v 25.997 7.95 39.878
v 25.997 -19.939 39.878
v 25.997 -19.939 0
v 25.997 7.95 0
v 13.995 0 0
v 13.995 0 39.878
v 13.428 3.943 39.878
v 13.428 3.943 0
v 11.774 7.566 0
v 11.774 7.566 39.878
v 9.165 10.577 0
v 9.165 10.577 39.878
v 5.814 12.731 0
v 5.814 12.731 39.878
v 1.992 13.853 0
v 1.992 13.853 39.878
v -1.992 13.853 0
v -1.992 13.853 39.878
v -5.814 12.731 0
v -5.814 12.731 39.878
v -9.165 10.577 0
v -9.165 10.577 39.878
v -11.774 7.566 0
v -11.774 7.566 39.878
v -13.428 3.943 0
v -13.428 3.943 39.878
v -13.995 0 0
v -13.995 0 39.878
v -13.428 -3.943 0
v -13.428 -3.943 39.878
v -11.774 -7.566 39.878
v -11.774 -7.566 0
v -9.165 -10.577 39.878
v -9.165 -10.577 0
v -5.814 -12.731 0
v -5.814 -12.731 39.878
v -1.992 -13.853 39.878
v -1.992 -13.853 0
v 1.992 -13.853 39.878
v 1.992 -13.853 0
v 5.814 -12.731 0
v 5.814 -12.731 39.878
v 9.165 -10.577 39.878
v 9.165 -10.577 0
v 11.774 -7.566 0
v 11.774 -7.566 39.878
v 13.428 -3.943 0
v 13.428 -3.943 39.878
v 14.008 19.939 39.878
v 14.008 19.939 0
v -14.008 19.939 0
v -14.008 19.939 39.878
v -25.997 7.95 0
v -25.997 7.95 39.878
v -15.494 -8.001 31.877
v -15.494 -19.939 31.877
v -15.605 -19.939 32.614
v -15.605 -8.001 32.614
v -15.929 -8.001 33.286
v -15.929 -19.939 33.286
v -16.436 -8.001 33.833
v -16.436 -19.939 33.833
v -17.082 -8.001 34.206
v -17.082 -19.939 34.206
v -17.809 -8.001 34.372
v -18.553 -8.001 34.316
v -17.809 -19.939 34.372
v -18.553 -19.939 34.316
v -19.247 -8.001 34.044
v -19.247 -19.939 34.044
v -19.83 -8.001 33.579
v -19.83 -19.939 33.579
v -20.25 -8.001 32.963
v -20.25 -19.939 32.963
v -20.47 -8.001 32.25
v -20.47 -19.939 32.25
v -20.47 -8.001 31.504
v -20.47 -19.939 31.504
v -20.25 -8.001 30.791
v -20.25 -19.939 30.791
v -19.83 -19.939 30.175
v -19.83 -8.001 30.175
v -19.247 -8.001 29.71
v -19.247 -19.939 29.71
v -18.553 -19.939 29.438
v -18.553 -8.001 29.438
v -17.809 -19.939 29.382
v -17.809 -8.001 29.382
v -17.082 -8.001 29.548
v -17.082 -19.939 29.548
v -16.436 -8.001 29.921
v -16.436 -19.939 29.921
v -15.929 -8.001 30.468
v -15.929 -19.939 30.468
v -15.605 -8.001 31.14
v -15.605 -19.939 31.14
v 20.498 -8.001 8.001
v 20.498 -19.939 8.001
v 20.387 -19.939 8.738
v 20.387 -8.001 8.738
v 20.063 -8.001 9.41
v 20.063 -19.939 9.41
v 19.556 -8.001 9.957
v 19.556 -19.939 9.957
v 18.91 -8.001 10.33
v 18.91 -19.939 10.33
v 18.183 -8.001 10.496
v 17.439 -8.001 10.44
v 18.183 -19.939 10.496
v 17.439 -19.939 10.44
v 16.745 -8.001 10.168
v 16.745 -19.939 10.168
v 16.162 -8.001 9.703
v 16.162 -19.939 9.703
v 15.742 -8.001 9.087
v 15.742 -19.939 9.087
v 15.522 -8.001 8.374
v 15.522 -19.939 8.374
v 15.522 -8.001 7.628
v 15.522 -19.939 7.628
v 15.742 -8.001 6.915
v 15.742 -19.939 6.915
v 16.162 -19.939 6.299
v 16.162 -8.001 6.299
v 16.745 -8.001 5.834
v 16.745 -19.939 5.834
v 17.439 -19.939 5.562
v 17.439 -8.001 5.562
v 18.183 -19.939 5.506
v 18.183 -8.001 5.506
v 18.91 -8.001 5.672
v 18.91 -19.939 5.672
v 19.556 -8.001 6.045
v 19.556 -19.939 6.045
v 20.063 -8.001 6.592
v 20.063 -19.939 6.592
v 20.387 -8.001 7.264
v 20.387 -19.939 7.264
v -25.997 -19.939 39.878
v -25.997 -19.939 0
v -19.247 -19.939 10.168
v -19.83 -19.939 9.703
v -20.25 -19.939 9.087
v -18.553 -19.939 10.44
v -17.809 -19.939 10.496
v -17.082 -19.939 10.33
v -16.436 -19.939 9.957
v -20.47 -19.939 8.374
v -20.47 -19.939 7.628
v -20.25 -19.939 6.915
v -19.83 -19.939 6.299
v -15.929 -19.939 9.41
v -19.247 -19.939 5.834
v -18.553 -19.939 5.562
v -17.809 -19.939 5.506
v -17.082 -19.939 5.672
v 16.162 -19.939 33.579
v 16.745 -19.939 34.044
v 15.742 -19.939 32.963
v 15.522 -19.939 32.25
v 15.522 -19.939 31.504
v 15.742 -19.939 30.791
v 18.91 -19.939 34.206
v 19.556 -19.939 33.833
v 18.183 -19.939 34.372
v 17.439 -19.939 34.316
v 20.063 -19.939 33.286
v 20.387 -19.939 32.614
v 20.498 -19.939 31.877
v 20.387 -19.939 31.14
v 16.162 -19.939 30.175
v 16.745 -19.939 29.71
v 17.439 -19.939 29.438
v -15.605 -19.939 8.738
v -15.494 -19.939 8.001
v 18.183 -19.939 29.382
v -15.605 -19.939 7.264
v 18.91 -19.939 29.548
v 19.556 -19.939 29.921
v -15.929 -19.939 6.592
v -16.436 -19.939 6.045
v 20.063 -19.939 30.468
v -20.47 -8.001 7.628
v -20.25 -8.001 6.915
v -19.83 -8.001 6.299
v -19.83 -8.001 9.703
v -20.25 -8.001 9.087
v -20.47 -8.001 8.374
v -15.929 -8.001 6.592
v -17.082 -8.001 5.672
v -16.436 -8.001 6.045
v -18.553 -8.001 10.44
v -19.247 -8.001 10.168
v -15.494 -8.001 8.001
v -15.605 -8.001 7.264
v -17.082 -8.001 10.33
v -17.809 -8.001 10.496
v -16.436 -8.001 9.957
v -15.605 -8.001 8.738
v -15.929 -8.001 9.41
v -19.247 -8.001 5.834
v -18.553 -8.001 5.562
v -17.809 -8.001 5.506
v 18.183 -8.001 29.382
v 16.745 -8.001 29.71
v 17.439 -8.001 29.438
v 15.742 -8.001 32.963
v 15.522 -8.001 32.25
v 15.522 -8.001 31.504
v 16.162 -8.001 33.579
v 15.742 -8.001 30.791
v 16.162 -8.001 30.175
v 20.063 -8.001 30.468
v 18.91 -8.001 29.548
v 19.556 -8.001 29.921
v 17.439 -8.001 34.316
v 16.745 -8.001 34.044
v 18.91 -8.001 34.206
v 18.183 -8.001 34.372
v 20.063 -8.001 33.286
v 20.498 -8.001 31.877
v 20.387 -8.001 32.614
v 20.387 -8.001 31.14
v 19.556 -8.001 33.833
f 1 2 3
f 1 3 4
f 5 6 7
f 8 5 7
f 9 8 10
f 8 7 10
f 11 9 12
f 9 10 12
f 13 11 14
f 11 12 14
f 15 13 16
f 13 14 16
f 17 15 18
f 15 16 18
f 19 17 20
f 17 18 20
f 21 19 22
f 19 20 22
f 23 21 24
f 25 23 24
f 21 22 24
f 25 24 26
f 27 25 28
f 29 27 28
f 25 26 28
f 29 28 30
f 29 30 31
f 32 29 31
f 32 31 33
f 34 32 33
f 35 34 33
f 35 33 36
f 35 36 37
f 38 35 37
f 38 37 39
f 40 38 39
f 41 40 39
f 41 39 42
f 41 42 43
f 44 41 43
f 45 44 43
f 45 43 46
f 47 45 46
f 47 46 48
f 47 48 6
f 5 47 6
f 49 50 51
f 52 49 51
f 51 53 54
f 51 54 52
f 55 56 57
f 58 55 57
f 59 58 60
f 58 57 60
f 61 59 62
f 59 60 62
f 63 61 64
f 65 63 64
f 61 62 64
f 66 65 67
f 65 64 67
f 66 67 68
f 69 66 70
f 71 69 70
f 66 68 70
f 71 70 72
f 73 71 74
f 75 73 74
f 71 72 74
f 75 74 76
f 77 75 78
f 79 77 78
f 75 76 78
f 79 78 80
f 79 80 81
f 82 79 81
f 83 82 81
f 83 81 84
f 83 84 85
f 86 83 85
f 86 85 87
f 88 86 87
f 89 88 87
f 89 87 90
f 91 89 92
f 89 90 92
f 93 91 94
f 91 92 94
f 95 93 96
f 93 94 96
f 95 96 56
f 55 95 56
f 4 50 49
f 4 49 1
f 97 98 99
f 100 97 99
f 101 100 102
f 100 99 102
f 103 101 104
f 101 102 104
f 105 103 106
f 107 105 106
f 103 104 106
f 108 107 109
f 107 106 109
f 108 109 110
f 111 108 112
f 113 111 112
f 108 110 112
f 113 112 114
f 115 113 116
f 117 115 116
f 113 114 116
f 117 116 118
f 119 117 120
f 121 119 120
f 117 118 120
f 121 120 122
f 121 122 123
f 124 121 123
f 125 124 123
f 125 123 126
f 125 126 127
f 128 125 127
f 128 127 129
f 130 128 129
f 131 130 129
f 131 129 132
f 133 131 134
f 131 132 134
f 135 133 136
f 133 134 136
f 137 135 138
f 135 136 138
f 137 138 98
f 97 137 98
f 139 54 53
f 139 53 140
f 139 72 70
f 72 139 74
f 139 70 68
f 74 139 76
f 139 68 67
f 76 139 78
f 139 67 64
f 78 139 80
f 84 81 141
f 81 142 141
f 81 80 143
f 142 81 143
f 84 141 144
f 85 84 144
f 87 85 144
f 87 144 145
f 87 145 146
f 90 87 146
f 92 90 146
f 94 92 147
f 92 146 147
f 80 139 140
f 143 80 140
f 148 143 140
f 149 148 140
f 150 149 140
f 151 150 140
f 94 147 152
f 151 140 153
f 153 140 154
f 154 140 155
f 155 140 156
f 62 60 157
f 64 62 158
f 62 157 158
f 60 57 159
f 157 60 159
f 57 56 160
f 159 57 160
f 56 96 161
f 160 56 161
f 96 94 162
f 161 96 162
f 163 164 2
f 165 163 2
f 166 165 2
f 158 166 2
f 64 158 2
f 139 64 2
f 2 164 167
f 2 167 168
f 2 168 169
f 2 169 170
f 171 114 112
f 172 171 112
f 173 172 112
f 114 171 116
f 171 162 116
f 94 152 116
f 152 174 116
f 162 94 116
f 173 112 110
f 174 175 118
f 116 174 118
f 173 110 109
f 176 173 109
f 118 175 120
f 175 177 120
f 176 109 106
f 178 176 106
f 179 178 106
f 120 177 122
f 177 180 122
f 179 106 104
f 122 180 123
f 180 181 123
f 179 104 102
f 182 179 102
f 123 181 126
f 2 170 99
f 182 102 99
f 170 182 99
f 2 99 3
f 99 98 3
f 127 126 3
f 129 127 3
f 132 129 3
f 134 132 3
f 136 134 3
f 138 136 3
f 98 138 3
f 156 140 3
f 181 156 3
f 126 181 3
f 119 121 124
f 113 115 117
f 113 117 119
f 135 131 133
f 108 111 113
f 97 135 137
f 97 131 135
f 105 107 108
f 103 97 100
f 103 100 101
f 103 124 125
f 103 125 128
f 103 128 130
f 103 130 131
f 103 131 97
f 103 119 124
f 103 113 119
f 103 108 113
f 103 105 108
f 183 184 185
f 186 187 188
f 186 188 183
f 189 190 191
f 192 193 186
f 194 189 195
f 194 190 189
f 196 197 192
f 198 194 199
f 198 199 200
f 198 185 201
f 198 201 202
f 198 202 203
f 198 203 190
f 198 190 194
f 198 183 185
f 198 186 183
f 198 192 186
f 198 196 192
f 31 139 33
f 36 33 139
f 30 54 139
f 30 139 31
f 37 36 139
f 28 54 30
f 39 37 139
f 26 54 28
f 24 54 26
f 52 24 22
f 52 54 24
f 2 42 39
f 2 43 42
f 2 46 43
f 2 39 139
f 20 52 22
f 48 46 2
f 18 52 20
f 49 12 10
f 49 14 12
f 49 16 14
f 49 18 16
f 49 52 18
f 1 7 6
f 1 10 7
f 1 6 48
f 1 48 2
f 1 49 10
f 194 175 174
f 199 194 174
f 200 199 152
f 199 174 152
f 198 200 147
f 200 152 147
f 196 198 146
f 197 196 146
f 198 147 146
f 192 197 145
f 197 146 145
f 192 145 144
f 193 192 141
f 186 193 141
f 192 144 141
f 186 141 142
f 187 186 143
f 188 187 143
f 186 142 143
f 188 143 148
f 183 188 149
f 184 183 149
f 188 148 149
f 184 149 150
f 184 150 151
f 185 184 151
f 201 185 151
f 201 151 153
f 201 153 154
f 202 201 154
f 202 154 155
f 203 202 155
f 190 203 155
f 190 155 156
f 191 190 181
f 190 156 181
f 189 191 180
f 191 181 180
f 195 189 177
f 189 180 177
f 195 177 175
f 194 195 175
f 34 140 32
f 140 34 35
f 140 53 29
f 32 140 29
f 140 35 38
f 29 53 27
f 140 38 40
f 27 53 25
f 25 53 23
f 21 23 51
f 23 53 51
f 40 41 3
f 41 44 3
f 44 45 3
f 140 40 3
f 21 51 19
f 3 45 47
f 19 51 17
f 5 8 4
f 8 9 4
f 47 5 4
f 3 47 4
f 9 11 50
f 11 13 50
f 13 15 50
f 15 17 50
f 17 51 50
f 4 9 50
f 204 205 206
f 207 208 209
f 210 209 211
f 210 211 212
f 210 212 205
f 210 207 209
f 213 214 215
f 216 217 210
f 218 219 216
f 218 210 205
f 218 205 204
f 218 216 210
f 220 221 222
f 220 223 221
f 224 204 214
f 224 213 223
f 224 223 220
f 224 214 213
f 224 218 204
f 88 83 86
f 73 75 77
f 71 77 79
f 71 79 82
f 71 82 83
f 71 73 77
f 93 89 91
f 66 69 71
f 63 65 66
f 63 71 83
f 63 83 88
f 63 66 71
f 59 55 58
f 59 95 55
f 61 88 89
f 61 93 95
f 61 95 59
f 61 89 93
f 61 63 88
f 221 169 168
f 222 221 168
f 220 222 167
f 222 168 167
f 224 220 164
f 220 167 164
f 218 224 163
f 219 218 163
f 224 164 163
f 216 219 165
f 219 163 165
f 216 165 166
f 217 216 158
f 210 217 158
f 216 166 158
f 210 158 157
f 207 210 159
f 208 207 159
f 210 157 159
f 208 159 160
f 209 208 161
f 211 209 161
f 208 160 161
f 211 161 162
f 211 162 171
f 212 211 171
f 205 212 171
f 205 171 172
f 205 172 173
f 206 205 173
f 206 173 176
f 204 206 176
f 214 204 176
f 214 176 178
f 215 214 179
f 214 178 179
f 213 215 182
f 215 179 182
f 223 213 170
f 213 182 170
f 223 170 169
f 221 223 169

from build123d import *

# Parameters (mm, degrees)
F1_DEPTH = 39.878
F2_R     = 13.9954
F3_DEPTH = 39.879
F4_DEPTH = 39.879
F5_DEPTH = 39.879
F6_R     = 2.5019
F7_DEPTH = 11.938


with BuildPart() as f1:
    # F0 (on Top) → F1 (new body)
    with BuildSketch(Plane.XY):
        Polygon((-25.9969, -19.939), (25.9969, -19.939), (25.9969, 7.9502), (14.0081, 19.939), (-14.0081, 19.939), (-25.9969, 7.9502), align=None)
        Polygon((14.0081, 19.939), (25.9969, 7.9502), (25.9969, 19.939), align=None)
        Polygon((-25.9969, 19.939), (-25.9969, 7.9502), (-14.0081, 19.939), align=None)
    extrude(amount=F1_DEPTH)

    # F2 (on face) → F3 (cut, through all)
    with BuildSketch(Plane.XY.offset(39.878)):
        Circle(F2_R)
    extrude(amount=-F3_DEPTH, mode=Mode.SUBTRACT)

    # F0 (on Top) → F4 (cut, through all)
    with BuildSketch(Plane.XY):
        Polygon((14.0081, 19.939), (25.9969, 7.9502), (25.9969, 19.939), align=None)
    extrude(amount=F4_DEPTH, mode=Mode.SUBTRACT)

    # F0 (on Top) → F5 (cut, through all)
    with BuildSketch(Plane.XY):
        Polygon((-25.9969, 19.939), (-25.9969, 7.9502), (-14.0081, 19.939), align=None)
    extrude(amount=F5_DEPTH, mode=Mode.SUBTRACT)

    # F6 (on face) → F7 (cut)
    with BuildSketch(Plane.XZ.offset(19.939)):
        with Locations((17.9959, 31.877)):
            Circle(F6_R)
        with Locations((17.9959, 8.001)):
            Circle(F6_R)
        with Locations((-17.9959, 8.001)):
            Circle(F6_R)
        with Locations((-17.9959, 31.877)):
            Circle(F6_R)
    extrude(amount=-F7_DEPTH, mode=Mode.SUBTRACT)


solid = f1.part
